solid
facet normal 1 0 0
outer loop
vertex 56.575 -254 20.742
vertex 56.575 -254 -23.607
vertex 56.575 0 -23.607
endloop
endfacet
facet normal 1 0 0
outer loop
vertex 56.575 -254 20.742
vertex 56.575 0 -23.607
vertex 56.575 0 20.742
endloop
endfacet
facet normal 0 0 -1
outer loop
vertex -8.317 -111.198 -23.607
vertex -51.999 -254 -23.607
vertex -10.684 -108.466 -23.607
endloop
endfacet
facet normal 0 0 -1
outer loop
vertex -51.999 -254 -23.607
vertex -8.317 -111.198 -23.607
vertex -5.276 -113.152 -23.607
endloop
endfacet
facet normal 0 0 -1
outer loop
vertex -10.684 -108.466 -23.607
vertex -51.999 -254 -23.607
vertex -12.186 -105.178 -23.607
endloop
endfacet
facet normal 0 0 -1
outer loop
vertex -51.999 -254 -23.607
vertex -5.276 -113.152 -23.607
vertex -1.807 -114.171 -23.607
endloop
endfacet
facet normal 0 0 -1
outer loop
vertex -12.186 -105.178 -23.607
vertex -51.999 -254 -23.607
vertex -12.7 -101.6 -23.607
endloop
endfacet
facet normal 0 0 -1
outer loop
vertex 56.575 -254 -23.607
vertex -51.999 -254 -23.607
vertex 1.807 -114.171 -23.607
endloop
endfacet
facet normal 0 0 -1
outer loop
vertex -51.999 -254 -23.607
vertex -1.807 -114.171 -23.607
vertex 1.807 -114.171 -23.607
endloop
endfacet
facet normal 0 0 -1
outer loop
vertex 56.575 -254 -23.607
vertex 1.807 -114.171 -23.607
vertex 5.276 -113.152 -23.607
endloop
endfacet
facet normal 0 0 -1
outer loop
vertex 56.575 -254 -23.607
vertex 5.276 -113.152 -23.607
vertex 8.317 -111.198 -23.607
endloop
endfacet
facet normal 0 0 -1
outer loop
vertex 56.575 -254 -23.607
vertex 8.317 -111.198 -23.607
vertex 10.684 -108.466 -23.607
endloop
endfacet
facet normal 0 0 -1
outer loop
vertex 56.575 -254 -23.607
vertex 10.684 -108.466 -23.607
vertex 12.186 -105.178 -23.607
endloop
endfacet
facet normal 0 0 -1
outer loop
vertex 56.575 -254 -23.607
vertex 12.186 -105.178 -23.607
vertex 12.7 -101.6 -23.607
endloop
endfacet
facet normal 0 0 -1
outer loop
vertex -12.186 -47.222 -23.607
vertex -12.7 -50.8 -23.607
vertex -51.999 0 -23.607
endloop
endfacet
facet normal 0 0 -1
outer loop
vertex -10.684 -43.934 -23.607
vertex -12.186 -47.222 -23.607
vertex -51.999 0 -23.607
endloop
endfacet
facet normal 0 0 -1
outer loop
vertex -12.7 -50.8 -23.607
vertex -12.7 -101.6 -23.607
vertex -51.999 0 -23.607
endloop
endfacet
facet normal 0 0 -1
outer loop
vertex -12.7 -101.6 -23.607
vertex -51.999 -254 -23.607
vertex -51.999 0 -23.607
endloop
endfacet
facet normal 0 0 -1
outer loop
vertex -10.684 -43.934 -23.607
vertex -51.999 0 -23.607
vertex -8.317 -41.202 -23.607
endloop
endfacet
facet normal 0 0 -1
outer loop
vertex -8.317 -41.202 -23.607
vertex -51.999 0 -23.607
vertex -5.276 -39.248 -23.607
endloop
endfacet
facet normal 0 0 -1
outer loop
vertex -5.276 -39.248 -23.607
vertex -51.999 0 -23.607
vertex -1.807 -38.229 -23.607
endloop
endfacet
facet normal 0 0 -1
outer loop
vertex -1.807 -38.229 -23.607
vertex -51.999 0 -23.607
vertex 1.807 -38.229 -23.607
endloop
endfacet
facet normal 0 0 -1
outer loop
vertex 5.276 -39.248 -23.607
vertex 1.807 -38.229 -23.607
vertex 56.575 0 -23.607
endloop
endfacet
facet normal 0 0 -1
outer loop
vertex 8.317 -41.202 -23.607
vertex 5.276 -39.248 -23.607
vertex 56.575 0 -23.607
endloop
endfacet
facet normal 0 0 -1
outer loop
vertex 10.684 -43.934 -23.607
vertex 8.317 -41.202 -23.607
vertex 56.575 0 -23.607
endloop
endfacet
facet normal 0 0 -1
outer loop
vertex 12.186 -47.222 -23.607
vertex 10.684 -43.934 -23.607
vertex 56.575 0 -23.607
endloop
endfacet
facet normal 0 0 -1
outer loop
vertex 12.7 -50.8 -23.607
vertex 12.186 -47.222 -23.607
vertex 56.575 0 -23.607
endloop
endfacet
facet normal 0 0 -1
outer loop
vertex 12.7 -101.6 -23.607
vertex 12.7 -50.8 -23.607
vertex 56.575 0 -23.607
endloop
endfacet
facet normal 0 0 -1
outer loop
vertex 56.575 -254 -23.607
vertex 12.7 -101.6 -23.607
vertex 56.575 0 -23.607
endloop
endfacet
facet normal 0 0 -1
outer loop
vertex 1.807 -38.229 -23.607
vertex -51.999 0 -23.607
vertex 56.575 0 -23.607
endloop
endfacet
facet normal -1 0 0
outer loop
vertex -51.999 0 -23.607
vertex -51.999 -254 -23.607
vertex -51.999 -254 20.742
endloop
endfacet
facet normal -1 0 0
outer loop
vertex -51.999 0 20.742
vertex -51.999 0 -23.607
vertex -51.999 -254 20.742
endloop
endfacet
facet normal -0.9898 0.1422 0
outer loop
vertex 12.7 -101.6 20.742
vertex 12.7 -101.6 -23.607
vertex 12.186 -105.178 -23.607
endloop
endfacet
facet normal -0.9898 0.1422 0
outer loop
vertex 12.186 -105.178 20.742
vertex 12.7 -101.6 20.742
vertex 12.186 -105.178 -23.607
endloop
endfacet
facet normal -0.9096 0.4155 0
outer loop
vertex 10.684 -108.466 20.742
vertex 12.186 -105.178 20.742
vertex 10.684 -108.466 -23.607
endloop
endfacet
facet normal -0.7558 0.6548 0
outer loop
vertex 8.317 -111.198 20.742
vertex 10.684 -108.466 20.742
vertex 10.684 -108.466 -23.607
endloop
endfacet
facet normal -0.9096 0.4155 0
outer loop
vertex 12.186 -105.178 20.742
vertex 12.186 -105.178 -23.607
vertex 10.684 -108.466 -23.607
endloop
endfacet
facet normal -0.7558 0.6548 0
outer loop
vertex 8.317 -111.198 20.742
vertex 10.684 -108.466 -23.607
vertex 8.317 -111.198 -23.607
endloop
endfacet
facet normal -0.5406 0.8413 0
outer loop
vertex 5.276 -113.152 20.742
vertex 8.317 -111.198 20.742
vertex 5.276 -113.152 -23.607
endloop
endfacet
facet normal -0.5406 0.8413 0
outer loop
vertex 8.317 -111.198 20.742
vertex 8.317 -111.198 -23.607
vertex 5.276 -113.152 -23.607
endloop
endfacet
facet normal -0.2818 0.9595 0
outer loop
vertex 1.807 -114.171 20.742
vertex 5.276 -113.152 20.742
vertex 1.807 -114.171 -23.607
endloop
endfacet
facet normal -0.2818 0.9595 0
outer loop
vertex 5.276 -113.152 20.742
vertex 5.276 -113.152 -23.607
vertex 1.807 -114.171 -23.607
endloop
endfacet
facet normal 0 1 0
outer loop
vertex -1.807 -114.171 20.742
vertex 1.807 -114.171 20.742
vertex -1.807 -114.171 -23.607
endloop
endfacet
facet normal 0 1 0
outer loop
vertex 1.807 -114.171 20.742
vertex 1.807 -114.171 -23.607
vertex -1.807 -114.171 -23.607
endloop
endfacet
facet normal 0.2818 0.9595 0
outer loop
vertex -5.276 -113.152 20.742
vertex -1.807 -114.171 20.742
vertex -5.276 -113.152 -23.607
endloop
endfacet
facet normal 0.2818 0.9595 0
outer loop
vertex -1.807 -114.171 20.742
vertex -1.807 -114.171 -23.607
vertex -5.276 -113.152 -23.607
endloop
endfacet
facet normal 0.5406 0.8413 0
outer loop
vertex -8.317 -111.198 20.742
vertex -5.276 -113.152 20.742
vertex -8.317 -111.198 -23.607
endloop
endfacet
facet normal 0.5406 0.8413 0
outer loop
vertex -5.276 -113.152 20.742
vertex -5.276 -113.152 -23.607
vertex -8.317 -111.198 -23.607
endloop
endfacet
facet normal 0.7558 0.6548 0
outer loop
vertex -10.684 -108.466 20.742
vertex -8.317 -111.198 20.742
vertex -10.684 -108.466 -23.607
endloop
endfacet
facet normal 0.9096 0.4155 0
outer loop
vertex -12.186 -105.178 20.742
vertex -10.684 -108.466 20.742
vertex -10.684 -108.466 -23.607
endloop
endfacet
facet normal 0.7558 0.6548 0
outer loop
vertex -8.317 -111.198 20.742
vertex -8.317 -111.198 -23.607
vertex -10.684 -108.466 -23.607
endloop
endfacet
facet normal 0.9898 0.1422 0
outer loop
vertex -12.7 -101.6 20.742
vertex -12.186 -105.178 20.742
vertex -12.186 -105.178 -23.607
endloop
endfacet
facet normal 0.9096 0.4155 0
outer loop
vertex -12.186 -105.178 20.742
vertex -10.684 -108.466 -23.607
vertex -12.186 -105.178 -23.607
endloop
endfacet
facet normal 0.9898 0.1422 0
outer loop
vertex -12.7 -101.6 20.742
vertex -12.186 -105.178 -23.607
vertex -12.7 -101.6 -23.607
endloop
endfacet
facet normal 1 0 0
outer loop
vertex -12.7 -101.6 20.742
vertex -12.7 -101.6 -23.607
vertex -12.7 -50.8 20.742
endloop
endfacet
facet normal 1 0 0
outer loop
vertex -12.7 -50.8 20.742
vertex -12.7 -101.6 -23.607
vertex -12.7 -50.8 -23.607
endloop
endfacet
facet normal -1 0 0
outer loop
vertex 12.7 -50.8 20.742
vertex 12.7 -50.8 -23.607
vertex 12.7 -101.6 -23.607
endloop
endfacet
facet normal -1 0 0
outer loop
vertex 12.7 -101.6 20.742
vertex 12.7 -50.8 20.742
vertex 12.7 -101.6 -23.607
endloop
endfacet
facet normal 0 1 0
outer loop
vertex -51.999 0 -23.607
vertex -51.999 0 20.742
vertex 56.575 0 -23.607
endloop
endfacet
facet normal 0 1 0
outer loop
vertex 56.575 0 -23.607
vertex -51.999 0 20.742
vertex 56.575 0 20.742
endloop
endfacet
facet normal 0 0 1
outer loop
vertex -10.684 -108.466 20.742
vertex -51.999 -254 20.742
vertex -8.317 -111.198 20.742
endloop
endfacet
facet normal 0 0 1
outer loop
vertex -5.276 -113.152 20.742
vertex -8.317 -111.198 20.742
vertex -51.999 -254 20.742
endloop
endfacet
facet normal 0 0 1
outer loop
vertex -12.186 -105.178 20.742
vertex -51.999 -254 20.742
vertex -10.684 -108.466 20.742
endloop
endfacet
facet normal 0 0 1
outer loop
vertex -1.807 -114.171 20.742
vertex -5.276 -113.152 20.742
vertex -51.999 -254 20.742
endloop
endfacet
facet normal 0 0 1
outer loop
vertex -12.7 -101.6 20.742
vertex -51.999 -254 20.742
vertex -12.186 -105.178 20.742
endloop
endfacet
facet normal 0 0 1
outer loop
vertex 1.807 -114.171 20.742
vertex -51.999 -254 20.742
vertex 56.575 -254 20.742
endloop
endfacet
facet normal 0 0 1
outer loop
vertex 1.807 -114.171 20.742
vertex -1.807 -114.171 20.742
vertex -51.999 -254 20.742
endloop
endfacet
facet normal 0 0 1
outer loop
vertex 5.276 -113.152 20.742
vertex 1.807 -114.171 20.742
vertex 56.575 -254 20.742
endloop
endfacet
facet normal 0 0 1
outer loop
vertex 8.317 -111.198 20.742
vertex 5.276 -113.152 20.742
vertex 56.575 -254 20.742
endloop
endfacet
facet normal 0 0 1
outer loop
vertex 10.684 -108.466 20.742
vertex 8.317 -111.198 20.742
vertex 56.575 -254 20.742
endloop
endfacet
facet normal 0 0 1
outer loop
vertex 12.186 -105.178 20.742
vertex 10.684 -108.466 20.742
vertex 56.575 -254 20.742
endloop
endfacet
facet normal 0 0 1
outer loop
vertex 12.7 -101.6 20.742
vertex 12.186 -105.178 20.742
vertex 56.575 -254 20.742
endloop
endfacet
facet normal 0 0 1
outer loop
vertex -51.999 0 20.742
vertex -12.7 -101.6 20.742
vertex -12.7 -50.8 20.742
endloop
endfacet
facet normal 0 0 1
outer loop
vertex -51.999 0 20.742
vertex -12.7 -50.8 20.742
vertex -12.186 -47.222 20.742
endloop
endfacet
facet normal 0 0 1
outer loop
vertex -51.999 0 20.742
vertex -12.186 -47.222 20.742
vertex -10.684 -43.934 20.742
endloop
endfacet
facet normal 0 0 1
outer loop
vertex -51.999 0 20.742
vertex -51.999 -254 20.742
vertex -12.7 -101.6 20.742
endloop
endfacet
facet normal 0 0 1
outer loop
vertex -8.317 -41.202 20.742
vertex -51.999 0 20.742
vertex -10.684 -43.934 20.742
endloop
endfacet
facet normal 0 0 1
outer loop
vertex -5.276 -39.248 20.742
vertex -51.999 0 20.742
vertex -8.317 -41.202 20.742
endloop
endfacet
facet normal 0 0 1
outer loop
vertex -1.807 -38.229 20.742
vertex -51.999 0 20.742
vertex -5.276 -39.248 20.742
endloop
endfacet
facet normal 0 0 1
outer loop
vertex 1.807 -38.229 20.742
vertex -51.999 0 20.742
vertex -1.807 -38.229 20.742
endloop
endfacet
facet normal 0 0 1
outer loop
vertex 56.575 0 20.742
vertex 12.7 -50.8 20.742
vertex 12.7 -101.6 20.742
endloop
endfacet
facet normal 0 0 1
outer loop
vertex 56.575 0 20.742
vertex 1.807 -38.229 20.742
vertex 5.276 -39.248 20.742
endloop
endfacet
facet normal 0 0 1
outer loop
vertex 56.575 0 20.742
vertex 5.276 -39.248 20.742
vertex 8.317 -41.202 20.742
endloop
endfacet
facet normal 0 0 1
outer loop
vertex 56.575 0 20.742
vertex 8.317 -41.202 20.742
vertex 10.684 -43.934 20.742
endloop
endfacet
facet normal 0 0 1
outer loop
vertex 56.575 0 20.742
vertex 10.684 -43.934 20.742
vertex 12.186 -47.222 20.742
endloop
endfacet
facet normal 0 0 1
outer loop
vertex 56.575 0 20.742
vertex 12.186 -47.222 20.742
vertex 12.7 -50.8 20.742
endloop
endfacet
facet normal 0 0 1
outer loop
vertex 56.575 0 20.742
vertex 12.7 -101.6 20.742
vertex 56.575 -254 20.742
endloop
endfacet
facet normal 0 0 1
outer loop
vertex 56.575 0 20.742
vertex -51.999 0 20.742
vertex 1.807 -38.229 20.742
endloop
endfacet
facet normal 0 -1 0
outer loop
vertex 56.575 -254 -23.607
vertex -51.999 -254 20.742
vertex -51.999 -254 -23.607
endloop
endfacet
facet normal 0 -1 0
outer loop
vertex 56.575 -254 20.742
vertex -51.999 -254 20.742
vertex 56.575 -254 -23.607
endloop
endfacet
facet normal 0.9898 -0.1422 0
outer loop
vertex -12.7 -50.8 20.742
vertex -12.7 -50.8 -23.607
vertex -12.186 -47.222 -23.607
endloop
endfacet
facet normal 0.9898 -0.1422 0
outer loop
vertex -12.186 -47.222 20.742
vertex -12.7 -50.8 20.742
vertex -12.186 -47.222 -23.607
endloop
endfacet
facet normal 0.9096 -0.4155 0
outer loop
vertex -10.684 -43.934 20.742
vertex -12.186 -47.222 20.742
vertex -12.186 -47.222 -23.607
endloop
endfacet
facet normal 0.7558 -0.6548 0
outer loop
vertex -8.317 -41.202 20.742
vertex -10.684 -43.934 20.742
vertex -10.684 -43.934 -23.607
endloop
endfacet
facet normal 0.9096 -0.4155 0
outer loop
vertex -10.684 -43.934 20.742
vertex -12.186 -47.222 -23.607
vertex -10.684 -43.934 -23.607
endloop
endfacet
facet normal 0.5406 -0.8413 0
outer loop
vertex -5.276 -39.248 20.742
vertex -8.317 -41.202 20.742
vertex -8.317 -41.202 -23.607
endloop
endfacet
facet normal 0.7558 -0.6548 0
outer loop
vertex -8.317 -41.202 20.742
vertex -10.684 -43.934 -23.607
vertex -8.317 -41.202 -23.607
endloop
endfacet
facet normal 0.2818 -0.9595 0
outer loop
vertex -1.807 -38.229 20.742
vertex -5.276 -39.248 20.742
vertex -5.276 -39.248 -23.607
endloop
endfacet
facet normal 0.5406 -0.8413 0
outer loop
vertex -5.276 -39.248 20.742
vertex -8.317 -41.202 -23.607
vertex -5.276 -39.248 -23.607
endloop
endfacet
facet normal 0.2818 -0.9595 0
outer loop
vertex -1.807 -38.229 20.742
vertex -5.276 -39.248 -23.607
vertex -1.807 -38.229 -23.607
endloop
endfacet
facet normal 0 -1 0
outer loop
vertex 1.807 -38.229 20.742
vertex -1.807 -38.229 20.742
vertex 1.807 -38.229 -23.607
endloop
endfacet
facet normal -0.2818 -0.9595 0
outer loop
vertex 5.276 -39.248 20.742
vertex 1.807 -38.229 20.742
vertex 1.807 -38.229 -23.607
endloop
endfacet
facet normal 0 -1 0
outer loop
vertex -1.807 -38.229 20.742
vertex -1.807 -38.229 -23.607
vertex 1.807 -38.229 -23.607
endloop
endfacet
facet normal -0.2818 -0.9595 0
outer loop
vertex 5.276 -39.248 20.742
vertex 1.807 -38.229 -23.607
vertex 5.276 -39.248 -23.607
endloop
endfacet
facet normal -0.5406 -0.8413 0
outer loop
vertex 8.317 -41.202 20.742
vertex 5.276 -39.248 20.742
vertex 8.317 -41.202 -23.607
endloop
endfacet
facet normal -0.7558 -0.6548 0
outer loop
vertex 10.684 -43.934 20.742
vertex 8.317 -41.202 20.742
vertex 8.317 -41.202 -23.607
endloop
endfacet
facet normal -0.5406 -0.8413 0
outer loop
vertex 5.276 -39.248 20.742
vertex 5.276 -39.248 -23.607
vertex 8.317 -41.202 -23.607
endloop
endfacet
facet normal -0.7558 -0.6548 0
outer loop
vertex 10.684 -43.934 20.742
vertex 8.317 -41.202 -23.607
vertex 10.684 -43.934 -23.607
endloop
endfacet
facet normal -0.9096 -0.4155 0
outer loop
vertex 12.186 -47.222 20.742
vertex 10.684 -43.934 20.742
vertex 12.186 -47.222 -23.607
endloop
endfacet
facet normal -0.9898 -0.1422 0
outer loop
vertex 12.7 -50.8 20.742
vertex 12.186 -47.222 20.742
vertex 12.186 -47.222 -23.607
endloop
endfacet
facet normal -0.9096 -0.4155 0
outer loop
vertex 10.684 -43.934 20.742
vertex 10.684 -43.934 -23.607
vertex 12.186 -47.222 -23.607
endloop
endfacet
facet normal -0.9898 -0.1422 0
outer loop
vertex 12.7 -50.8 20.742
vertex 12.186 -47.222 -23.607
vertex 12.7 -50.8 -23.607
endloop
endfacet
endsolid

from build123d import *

# Parameters (mm, degrees)
F0_W     = 108.5735373199
F0_H     = 44.3482641131
F1_DEPTH = 254
F3_DEPTH = 76.2


with BuildPart() as f1:
    # F0 (on Front) → F1 (new body)
    with BuildSketch(Plane.XZ):
        with Locations((2.2877622396, -1.4324570075)):
            Rectangle(F0_W, F0_H)
    extrude(amount=F1_DEPTH)

    # F2 (on face) → F3 (cut)
    with BuildSketch(Plane(origin=(0, 0, -23.606589064), x_dir=(1, 0, 0), z_dir=(0, 0, -1))):
        with BuildLine():
            Line((0, 50.8), (-12.7, 50.8))
            ThreePointArc((-12.7, 50.8), (0, 38.1), (12.7, 50.8))
            Line((12.7, 50.8), (0, 50.8))
        make_face()
        with BuildLine():
            Line((-12.7, 101.6), (-12.7, 50.8))
            ThreePointArc((-12.7, 50.8), (-8.9802561211, 59.7802561211), (0, 63.5))
            Line((0, 63.5), (0, 88.9))
            ThreePointArc((0, 88.9), (-8.9802561211, 92.6197438789), (-12.7, 101.6))
        make_face()
        with BuildLine():
            ThreePointArc((0, 63.5), (-8.9802561211, 59.7802561211), (-12.7, 50.8))
            Line((-12.7, 50.8), (0, 50.8))
            Line((0, 50.8), (0, 63.5))
        make_face()
        with BuildLine():
            Line((0, 50.8), (12.7, 50.8))
            ThreePointArc((12.7, 50.8), (8.9802561211, 59.7802561211), (0, 63.5))
            Line((0, 63.5), (0, 50.8))
        make_face()
        with BuildLine():
            ThreePointArc((0, 63.5), (8.9802561211, 59.7802561211), (12.7, 50.8))
            Line((12.7, 50.8), (12.7, 101.6))
            ThreePointArc((12.7, 101.6), (8.9802561211, 92.6197438789), (0, 88.9))
            Line((0, 88.9), (0, 63.5))
        make_face()
        with BuildLine():
            Line((0, 101.6), (-12.7, 101.6))
            ThreePointArc((-12.7, 101.6), (-8.9802561211, 92.6197438789), (0, 88.9))
            Line((0, 88.9), (0, 101.6))
        make_face()
        with BuildLine():
            ThreePointArc((12.7, 101.6), (0, 114.3), (-12.7, 101.6))
            Line((-12.7, 101.6), (0, 101.6))
            Line((0, 101.6), (12.7, 101.6))
        make_face()
        with BuildLine():
            ThreePointArc((0, 88.9), (8.9802561211, 92.6197438789), (12.7, 101.6))
            Line((12.7, 101.6), (0, 101.6))
            Line((0, 101.6), (0, 88.9))
        make_face()
    extrude(amount=-F3_DEPTH, mode=Mode.SUBTRACT)


solid = f1.part
